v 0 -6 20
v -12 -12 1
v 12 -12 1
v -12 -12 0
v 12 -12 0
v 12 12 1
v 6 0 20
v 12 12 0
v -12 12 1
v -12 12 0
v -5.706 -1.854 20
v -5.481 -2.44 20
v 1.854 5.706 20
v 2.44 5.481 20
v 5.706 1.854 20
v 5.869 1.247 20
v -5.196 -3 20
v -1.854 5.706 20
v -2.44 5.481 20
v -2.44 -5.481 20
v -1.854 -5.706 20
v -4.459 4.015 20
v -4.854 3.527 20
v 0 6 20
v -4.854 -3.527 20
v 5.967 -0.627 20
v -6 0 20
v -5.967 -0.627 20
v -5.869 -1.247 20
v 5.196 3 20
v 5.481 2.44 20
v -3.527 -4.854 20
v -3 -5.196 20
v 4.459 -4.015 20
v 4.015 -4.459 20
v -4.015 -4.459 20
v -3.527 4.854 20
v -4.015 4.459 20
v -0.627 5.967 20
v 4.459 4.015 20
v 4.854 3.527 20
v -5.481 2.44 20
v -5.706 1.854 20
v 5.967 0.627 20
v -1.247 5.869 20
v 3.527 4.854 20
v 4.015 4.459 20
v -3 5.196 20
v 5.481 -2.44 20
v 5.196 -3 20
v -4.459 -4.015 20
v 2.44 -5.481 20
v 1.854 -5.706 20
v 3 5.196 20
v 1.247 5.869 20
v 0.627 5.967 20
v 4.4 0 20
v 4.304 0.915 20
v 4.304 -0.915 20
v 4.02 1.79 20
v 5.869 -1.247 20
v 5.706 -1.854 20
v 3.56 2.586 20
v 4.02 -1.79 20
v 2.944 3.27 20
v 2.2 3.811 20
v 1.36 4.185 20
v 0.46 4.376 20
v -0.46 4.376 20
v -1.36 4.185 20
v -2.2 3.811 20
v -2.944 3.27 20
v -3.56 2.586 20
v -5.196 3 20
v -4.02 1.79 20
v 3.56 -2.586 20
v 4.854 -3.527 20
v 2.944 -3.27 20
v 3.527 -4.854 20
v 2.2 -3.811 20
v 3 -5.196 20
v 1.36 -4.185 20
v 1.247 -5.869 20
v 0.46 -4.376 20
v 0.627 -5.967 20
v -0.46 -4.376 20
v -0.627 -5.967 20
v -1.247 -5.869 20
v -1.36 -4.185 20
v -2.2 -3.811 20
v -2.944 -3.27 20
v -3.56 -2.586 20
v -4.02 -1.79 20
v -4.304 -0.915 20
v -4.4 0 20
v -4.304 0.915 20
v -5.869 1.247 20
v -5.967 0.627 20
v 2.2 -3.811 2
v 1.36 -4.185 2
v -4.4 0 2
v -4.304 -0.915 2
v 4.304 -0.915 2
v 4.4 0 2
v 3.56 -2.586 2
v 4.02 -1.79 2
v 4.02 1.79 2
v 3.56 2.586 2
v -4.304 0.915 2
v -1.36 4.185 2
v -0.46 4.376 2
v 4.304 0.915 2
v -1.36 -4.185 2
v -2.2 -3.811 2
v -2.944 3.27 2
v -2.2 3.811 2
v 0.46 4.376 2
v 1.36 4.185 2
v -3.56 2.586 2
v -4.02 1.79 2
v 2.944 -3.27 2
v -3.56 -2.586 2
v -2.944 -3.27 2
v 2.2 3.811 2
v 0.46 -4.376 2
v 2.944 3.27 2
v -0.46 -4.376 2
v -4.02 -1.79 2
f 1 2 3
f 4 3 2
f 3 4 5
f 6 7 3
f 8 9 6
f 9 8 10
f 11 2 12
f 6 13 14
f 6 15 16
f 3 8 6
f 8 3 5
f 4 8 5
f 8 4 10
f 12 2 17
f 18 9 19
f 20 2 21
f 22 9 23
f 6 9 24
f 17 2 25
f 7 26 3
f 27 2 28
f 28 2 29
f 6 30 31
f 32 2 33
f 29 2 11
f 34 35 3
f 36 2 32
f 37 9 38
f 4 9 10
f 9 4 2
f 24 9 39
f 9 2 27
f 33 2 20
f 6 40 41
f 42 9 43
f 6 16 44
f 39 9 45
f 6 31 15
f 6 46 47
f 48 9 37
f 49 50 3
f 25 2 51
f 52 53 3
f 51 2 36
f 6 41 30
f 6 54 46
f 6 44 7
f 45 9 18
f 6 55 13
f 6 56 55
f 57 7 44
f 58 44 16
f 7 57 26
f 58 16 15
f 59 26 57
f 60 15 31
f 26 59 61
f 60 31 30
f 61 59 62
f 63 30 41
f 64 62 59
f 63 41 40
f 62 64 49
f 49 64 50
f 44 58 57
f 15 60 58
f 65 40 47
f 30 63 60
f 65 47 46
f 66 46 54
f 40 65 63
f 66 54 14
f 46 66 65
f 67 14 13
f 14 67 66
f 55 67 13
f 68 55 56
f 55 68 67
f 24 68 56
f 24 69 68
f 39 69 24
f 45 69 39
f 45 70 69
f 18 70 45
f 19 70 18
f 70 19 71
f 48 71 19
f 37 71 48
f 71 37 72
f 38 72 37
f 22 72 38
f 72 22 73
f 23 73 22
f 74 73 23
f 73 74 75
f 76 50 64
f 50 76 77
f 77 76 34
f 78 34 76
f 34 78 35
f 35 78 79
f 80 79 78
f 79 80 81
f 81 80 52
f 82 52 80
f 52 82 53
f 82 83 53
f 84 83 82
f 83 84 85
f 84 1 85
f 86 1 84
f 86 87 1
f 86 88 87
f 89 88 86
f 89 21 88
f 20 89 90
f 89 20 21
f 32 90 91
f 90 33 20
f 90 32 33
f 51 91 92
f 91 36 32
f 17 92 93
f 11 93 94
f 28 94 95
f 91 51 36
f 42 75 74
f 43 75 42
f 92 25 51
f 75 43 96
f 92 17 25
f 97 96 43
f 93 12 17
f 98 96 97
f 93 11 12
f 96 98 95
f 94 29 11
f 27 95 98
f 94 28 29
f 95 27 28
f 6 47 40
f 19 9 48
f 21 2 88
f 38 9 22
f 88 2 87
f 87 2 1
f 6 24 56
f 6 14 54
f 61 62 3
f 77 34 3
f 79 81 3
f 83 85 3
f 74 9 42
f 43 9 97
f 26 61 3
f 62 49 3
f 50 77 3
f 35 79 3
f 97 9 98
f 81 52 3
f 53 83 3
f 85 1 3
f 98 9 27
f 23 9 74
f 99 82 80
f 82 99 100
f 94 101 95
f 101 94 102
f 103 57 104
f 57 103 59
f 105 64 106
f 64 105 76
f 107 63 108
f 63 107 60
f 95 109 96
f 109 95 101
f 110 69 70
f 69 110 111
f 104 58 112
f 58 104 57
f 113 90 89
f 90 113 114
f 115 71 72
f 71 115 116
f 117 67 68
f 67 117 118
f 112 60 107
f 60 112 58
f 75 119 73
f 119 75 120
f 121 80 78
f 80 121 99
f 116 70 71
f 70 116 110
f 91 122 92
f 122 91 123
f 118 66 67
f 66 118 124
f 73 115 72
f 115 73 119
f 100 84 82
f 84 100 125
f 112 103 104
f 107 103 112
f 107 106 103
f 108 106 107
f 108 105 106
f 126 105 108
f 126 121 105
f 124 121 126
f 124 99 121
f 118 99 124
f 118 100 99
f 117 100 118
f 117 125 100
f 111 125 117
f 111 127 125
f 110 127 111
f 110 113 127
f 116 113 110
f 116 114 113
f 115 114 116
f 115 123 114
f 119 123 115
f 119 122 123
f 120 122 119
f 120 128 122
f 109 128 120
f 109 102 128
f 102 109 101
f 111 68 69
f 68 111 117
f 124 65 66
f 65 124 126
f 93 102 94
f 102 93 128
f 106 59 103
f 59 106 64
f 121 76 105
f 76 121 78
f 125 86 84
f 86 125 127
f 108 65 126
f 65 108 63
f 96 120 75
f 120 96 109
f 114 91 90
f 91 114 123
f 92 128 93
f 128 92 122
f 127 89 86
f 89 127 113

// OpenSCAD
difference(){
hull(){
translate([-12,-12,0])cube([24,24,1]);
translate([0,0,0])cylinder(d=12,h=20,$fn=60);
}
translate([0,0,2])cylinder(d=8.8,h=20,$fn=30);
}
